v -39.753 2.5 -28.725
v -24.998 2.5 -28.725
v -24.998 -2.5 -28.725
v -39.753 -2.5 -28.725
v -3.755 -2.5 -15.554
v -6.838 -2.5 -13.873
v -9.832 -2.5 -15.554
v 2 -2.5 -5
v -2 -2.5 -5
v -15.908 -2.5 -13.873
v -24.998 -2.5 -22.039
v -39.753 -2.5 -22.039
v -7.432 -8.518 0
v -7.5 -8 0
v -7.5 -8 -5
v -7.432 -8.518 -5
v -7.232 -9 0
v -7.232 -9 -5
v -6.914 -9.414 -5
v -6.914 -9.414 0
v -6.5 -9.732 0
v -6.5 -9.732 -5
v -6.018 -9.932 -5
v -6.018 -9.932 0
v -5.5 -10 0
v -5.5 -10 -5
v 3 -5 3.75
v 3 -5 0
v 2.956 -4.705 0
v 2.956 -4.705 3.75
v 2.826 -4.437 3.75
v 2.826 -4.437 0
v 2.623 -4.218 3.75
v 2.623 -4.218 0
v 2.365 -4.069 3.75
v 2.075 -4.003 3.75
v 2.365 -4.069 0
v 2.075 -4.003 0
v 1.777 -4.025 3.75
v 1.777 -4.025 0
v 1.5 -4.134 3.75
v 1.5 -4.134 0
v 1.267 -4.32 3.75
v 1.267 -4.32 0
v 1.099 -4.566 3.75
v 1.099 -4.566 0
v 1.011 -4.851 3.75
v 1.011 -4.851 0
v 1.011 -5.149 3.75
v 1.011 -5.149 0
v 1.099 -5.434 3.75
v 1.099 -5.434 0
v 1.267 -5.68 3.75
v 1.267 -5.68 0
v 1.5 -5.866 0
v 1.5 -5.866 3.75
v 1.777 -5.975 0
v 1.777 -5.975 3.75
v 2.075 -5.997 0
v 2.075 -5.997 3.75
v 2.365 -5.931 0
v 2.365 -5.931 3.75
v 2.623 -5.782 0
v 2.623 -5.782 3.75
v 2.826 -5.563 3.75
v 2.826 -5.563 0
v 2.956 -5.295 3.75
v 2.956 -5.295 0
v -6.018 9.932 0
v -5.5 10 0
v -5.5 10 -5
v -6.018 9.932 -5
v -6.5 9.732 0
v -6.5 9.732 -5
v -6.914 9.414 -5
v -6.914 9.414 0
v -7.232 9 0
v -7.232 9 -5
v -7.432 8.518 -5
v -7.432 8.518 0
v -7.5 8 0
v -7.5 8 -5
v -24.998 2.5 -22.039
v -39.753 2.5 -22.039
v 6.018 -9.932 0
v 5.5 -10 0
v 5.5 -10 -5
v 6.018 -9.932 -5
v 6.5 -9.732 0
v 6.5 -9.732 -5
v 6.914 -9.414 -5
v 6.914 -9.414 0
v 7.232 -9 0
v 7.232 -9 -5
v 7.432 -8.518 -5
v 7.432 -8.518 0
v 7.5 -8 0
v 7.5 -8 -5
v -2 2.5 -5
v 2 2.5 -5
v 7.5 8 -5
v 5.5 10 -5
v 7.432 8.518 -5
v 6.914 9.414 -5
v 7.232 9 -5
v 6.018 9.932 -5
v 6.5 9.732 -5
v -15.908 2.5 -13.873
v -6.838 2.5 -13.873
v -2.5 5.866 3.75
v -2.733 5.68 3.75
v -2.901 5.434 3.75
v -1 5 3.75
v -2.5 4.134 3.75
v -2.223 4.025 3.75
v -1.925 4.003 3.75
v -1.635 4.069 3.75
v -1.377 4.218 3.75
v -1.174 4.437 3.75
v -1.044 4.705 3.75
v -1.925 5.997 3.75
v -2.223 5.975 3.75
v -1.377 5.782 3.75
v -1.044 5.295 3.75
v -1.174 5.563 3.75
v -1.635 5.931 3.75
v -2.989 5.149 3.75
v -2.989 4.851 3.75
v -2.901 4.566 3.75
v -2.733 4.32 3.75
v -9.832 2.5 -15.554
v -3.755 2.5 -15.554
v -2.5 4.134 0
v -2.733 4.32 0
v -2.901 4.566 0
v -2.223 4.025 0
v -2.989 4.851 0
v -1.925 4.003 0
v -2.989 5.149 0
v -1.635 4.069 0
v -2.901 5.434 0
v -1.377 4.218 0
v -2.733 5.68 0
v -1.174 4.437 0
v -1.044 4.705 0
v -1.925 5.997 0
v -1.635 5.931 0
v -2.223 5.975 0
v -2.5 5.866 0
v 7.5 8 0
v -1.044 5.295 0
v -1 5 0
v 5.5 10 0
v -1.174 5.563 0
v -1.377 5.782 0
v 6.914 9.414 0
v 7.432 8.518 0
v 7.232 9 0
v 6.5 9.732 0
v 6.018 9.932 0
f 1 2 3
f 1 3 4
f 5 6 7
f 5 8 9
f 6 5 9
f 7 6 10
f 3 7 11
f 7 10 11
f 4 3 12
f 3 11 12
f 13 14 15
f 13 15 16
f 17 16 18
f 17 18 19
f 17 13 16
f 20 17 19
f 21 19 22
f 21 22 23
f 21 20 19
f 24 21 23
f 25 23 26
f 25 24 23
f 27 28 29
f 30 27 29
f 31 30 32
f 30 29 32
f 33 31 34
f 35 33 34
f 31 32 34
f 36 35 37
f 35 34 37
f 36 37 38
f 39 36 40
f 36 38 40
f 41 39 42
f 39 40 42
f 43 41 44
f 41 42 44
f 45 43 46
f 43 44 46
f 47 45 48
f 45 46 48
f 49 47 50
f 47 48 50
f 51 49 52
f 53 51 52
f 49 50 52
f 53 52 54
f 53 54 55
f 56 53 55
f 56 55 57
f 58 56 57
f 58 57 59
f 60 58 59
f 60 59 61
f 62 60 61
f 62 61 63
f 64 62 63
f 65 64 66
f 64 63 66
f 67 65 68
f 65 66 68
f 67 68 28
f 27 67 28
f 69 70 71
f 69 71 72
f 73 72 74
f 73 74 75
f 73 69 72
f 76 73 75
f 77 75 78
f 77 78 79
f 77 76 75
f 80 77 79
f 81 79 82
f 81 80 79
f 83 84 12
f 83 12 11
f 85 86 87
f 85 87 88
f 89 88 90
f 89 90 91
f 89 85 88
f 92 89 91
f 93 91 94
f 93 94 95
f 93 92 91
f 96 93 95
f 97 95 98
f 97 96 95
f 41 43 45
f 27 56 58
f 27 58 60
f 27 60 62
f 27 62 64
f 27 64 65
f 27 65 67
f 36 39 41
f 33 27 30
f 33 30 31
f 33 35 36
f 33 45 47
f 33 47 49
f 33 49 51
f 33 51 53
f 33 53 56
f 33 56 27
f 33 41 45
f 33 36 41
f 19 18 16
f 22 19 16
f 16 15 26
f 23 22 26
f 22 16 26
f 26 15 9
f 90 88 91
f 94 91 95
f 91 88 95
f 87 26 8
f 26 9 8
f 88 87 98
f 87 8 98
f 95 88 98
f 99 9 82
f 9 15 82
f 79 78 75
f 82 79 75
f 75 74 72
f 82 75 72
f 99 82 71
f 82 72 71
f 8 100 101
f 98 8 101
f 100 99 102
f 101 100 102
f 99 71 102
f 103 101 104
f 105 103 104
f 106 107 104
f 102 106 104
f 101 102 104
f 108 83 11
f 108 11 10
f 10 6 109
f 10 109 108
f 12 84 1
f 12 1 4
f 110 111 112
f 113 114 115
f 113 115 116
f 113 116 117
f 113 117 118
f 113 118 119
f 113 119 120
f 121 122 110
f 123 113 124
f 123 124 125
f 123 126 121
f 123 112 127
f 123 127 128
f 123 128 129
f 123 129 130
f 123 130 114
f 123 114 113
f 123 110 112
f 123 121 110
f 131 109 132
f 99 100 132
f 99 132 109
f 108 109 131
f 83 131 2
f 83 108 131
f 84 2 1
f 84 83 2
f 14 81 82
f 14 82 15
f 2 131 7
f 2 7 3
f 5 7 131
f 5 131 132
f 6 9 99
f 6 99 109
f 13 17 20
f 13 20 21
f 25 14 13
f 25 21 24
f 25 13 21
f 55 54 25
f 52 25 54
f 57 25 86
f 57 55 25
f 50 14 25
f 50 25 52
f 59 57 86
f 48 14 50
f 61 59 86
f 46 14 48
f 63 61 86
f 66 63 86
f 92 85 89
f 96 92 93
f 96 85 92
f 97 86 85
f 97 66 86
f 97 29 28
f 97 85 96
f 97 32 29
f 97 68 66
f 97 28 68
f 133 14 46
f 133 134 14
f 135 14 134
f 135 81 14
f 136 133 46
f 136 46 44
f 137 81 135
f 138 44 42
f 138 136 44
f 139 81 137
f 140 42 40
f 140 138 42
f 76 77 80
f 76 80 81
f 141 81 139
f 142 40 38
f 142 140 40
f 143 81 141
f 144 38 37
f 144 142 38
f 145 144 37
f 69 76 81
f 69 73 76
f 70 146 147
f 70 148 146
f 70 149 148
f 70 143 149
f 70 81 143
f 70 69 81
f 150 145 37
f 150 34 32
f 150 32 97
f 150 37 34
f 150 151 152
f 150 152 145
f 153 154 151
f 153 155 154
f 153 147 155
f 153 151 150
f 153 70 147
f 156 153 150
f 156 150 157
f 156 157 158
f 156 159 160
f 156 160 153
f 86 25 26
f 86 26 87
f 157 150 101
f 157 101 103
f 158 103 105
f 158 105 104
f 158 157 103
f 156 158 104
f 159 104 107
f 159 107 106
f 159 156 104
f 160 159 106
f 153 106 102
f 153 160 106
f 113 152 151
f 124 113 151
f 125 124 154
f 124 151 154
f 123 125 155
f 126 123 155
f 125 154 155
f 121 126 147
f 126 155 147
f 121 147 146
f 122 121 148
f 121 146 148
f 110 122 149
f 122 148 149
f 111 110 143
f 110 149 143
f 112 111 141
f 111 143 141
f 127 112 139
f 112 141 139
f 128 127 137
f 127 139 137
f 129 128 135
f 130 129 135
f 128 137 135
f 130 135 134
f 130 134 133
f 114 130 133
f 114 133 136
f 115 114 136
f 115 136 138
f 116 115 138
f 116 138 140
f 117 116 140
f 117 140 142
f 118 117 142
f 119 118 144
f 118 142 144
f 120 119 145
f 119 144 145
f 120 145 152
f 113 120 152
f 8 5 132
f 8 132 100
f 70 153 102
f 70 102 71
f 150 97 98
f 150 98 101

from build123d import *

# Parameters (mm, degrees)
ESQUISSE1_R             = 1
BOSS_EXTRU_1_DEPTH      = 3.75
BOSS_EXTRU_1_2_DEPTH    = 3.75
BOSS_EXTRU_2_DEPTH      = 5
BOSS_EXTRU_3_DEPTH      = 2.5
BOSS_EXTRU_3_DEPTH_BACK = 2.5
BOSS_EXTRU_4_START      = -5
BOSS_EXTRU_4_DEPTH      = 5
ENL_V_MAT_EXTRU_1_DEPTH = 10


with BuildPart() as part:
    # Esquisse1 → Boss.-Extru.1 (new body)
    with BuildSketch(Plane.XY):
        with Locations((-2, 5)):
            Circle(ESQUISSE1_R)
    extrude(amount=BOSS_EXTRU_1_DEPTH)



with BuildPart() as body_2:
    # Esquisse1 → Boss.-Extru.1 2 (new body)
    with BuildSketch(Plane.XY):
        with Locations((2, -5)):
            Circle(ESQUISSE1_R)
    extrude(amount=BOSS_EXTRU_1_2_DEPTH)


with BuildPart() as part_1:
    add(part.part)

    add(body_2.part)  # Boss.-Extru.2 merges body 2
    # Esquisse2 → Boss.-Extru.2 (add)
    with BuildSketch(Plane.XY):
        with BuildLine():
            Line((-5.5, -10), (5.5, -10))
            ThreePointArc((5.5, -10), (6.914213562, -9.414213562), (7.5, -8))
            Line((7.5, -8), (7.5, 8))
            ThreePointArc((7.5, 8), (6.914213562, 9.414213562), (5.5, 10))
            Line((5.5, 10), (-5.5, 10))
            ThreePointArc((-5.5, 10), (-6.914213562, 9.414213562), (-7.5, 8))
            Line((-7.5, 8), (-7.5, -8))
            ThreePointArc((-7.5, -8), (-6.914213562, -9.414213562), (-5.5, -10))
        make_face()
    extrude(amount=-BOSS_EXTRU_2_DEPTH)

    # Esquisse3 → Boss.-Extru.3 (add, two sides: drawn at the far end of the back side and taken through both)
    with BuildSketch(Plane(origin=(0, 0, 0), x_dir=(1, 0, 0), z_dir=(0, 1, 0)).offset(-BOSS_EXTRU_3_DEPTH_BACK)):
        Polygon((-15.908235074, 13.872743974), (-15.908235074, 15.554043285), (-3.755300915, 15.554043285), (2, 5), (-2, 5), (-6.838459549, 13.872743974), align=None)
    extrude(amount=BOSS_EXTRU_3_DEPTH + BOSS_EXTRU_3_DEPTH_BACK)

    # Esquisse4 → Boss.-Extru.4 (add)
    with BuildSketch(Plane.XZ.offset(2.5).offset(BOSS_EXTRU_4_START)):
        Polygon((-9.831767995, -15.554043285), (-24.998481753, -28.725072904), (-74.998481753, -28.725072904), (-74.998481753, -22.039407789), (-24.998481753, -22.039407789), (-15.908235074, -13.872743974), align=None)
    extrude(amount=BOSS_EXTRU_4_DEPTH)

    # Esquisse6 → Enlèv. mat.-Extru.1 (cut)
    with BuildSketch(Plane(origin=(0, 0, -28.725072904), x_dir=(-1, 0, 0), z_dir=(0, 0, -1))):
        Polygon((39.752900497, -2.5), (39.752900497, 2.5), (50.637754923, 9.880645694), (75.638904933, 6.190322847), (75.638904933, -4.915953291), (39.752900497, -8.60093005), align=None)
    extrude(amount=-ENL_V_MAT_EXTRU_1_DEPTH, mode=Mode.SUBTRACT)


solid = part_1.part
